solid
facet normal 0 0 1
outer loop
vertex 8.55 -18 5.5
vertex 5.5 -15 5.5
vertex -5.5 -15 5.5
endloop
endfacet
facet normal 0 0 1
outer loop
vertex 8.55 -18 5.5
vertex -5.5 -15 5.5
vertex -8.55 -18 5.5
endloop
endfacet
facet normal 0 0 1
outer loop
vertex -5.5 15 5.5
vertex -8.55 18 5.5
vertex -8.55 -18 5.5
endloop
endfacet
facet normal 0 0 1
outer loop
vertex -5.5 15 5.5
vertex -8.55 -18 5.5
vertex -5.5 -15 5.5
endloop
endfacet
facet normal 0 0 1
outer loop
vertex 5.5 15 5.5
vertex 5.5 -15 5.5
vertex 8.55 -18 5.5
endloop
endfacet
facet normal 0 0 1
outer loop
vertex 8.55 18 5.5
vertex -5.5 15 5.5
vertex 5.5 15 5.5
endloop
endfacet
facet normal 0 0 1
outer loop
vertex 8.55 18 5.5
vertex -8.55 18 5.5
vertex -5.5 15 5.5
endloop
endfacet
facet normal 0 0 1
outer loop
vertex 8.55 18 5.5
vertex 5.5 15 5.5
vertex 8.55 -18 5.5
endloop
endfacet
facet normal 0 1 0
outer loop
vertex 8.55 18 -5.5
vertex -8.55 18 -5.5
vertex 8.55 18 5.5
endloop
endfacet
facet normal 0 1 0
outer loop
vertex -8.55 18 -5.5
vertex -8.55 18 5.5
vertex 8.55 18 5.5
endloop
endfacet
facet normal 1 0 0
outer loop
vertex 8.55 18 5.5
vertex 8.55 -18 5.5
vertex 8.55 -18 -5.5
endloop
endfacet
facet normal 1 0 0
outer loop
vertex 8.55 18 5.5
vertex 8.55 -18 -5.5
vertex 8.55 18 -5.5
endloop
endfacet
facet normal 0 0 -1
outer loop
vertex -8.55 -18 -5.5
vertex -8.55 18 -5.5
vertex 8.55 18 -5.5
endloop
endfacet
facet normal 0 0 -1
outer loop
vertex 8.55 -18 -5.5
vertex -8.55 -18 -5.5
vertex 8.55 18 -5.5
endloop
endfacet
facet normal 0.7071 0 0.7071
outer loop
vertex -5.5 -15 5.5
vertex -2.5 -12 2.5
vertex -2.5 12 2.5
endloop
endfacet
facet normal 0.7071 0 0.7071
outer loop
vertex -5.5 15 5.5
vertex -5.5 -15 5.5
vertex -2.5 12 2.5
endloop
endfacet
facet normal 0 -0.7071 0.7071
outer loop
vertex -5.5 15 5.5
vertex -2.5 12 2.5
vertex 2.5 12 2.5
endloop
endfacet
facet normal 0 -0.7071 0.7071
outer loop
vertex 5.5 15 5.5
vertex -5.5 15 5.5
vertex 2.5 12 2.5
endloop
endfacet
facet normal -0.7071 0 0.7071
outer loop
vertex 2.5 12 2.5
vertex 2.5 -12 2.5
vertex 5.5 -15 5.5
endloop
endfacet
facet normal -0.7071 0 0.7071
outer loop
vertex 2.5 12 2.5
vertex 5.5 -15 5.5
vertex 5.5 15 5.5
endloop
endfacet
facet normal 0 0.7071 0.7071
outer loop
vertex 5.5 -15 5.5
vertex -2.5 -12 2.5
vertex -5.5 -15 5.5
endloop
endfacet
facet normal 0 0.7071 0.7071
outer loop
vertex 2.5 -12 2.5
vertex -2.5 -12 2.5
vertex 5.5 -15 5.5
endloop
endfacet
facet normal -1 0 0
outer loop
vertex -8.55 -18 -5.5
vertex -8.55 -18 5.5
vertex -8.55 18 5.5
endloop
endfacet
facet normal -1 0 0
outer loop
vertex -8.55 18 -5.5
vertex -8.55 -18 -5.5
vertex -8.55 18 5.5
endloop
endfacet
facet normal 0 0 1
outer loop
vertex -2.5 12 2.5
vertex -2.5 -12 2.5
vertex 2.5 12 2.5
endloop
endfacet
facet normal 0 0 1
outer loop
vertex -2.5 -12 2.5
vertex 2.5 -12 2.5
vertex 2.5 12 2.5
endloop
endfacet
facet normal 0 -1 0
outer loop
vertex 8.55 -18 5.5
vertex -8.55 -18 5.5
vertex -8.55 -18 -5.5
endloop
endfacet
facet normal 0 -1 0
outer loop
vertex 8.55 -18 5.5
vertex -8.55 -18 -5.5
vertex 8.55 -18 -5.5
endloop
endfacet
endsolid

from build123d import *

# Parameters (mm, degrees)
F3_W     = 17.1
F3_H     = 36
F0_DEPTH = 5.5
F4_W     = 30
F4_H     = 3
F1_DEPTH = 5.5
F2_SIZE  = 2.99999


# Not quite as in the source:
# - a fillet or chamfer is up to 0.001 mm smaller than in the source, because OpenCascade refuses the exact size


with BuildPart() as f0:
    # F3 (on Top) → F0 (new body, symmetric)
    with BuildSketch(Plane.XY):
        Rectangle(F3_W, F3_H)
    extrude(amount=F0_DEPTH, both=True)

    # F4 (on Right) → F1 (cut, symmetric)
    with BuildSketch(Plane.YZ):
        with Locations((0, 4)):
            Rectangle(F4_W, F4_H)
    extrude(amount=F1_DEPTH, both=True, mode=Mode.SUBTRACT)

    # F2 (size 3 in the source; OpenCascade refuses exactly that, so slightly less here)
    f2_edges = [f0.edges().sort_by_distance(p)[0] for p in [
        (-5.5, 0, 2.5),
        (0, -15, 2.5),
        (0, 15, 2.5),
        (5.5, 0, 2.5),
    ]]
    chamfer(f2_edges, length=F2_SIZE)


solid = f0.part
